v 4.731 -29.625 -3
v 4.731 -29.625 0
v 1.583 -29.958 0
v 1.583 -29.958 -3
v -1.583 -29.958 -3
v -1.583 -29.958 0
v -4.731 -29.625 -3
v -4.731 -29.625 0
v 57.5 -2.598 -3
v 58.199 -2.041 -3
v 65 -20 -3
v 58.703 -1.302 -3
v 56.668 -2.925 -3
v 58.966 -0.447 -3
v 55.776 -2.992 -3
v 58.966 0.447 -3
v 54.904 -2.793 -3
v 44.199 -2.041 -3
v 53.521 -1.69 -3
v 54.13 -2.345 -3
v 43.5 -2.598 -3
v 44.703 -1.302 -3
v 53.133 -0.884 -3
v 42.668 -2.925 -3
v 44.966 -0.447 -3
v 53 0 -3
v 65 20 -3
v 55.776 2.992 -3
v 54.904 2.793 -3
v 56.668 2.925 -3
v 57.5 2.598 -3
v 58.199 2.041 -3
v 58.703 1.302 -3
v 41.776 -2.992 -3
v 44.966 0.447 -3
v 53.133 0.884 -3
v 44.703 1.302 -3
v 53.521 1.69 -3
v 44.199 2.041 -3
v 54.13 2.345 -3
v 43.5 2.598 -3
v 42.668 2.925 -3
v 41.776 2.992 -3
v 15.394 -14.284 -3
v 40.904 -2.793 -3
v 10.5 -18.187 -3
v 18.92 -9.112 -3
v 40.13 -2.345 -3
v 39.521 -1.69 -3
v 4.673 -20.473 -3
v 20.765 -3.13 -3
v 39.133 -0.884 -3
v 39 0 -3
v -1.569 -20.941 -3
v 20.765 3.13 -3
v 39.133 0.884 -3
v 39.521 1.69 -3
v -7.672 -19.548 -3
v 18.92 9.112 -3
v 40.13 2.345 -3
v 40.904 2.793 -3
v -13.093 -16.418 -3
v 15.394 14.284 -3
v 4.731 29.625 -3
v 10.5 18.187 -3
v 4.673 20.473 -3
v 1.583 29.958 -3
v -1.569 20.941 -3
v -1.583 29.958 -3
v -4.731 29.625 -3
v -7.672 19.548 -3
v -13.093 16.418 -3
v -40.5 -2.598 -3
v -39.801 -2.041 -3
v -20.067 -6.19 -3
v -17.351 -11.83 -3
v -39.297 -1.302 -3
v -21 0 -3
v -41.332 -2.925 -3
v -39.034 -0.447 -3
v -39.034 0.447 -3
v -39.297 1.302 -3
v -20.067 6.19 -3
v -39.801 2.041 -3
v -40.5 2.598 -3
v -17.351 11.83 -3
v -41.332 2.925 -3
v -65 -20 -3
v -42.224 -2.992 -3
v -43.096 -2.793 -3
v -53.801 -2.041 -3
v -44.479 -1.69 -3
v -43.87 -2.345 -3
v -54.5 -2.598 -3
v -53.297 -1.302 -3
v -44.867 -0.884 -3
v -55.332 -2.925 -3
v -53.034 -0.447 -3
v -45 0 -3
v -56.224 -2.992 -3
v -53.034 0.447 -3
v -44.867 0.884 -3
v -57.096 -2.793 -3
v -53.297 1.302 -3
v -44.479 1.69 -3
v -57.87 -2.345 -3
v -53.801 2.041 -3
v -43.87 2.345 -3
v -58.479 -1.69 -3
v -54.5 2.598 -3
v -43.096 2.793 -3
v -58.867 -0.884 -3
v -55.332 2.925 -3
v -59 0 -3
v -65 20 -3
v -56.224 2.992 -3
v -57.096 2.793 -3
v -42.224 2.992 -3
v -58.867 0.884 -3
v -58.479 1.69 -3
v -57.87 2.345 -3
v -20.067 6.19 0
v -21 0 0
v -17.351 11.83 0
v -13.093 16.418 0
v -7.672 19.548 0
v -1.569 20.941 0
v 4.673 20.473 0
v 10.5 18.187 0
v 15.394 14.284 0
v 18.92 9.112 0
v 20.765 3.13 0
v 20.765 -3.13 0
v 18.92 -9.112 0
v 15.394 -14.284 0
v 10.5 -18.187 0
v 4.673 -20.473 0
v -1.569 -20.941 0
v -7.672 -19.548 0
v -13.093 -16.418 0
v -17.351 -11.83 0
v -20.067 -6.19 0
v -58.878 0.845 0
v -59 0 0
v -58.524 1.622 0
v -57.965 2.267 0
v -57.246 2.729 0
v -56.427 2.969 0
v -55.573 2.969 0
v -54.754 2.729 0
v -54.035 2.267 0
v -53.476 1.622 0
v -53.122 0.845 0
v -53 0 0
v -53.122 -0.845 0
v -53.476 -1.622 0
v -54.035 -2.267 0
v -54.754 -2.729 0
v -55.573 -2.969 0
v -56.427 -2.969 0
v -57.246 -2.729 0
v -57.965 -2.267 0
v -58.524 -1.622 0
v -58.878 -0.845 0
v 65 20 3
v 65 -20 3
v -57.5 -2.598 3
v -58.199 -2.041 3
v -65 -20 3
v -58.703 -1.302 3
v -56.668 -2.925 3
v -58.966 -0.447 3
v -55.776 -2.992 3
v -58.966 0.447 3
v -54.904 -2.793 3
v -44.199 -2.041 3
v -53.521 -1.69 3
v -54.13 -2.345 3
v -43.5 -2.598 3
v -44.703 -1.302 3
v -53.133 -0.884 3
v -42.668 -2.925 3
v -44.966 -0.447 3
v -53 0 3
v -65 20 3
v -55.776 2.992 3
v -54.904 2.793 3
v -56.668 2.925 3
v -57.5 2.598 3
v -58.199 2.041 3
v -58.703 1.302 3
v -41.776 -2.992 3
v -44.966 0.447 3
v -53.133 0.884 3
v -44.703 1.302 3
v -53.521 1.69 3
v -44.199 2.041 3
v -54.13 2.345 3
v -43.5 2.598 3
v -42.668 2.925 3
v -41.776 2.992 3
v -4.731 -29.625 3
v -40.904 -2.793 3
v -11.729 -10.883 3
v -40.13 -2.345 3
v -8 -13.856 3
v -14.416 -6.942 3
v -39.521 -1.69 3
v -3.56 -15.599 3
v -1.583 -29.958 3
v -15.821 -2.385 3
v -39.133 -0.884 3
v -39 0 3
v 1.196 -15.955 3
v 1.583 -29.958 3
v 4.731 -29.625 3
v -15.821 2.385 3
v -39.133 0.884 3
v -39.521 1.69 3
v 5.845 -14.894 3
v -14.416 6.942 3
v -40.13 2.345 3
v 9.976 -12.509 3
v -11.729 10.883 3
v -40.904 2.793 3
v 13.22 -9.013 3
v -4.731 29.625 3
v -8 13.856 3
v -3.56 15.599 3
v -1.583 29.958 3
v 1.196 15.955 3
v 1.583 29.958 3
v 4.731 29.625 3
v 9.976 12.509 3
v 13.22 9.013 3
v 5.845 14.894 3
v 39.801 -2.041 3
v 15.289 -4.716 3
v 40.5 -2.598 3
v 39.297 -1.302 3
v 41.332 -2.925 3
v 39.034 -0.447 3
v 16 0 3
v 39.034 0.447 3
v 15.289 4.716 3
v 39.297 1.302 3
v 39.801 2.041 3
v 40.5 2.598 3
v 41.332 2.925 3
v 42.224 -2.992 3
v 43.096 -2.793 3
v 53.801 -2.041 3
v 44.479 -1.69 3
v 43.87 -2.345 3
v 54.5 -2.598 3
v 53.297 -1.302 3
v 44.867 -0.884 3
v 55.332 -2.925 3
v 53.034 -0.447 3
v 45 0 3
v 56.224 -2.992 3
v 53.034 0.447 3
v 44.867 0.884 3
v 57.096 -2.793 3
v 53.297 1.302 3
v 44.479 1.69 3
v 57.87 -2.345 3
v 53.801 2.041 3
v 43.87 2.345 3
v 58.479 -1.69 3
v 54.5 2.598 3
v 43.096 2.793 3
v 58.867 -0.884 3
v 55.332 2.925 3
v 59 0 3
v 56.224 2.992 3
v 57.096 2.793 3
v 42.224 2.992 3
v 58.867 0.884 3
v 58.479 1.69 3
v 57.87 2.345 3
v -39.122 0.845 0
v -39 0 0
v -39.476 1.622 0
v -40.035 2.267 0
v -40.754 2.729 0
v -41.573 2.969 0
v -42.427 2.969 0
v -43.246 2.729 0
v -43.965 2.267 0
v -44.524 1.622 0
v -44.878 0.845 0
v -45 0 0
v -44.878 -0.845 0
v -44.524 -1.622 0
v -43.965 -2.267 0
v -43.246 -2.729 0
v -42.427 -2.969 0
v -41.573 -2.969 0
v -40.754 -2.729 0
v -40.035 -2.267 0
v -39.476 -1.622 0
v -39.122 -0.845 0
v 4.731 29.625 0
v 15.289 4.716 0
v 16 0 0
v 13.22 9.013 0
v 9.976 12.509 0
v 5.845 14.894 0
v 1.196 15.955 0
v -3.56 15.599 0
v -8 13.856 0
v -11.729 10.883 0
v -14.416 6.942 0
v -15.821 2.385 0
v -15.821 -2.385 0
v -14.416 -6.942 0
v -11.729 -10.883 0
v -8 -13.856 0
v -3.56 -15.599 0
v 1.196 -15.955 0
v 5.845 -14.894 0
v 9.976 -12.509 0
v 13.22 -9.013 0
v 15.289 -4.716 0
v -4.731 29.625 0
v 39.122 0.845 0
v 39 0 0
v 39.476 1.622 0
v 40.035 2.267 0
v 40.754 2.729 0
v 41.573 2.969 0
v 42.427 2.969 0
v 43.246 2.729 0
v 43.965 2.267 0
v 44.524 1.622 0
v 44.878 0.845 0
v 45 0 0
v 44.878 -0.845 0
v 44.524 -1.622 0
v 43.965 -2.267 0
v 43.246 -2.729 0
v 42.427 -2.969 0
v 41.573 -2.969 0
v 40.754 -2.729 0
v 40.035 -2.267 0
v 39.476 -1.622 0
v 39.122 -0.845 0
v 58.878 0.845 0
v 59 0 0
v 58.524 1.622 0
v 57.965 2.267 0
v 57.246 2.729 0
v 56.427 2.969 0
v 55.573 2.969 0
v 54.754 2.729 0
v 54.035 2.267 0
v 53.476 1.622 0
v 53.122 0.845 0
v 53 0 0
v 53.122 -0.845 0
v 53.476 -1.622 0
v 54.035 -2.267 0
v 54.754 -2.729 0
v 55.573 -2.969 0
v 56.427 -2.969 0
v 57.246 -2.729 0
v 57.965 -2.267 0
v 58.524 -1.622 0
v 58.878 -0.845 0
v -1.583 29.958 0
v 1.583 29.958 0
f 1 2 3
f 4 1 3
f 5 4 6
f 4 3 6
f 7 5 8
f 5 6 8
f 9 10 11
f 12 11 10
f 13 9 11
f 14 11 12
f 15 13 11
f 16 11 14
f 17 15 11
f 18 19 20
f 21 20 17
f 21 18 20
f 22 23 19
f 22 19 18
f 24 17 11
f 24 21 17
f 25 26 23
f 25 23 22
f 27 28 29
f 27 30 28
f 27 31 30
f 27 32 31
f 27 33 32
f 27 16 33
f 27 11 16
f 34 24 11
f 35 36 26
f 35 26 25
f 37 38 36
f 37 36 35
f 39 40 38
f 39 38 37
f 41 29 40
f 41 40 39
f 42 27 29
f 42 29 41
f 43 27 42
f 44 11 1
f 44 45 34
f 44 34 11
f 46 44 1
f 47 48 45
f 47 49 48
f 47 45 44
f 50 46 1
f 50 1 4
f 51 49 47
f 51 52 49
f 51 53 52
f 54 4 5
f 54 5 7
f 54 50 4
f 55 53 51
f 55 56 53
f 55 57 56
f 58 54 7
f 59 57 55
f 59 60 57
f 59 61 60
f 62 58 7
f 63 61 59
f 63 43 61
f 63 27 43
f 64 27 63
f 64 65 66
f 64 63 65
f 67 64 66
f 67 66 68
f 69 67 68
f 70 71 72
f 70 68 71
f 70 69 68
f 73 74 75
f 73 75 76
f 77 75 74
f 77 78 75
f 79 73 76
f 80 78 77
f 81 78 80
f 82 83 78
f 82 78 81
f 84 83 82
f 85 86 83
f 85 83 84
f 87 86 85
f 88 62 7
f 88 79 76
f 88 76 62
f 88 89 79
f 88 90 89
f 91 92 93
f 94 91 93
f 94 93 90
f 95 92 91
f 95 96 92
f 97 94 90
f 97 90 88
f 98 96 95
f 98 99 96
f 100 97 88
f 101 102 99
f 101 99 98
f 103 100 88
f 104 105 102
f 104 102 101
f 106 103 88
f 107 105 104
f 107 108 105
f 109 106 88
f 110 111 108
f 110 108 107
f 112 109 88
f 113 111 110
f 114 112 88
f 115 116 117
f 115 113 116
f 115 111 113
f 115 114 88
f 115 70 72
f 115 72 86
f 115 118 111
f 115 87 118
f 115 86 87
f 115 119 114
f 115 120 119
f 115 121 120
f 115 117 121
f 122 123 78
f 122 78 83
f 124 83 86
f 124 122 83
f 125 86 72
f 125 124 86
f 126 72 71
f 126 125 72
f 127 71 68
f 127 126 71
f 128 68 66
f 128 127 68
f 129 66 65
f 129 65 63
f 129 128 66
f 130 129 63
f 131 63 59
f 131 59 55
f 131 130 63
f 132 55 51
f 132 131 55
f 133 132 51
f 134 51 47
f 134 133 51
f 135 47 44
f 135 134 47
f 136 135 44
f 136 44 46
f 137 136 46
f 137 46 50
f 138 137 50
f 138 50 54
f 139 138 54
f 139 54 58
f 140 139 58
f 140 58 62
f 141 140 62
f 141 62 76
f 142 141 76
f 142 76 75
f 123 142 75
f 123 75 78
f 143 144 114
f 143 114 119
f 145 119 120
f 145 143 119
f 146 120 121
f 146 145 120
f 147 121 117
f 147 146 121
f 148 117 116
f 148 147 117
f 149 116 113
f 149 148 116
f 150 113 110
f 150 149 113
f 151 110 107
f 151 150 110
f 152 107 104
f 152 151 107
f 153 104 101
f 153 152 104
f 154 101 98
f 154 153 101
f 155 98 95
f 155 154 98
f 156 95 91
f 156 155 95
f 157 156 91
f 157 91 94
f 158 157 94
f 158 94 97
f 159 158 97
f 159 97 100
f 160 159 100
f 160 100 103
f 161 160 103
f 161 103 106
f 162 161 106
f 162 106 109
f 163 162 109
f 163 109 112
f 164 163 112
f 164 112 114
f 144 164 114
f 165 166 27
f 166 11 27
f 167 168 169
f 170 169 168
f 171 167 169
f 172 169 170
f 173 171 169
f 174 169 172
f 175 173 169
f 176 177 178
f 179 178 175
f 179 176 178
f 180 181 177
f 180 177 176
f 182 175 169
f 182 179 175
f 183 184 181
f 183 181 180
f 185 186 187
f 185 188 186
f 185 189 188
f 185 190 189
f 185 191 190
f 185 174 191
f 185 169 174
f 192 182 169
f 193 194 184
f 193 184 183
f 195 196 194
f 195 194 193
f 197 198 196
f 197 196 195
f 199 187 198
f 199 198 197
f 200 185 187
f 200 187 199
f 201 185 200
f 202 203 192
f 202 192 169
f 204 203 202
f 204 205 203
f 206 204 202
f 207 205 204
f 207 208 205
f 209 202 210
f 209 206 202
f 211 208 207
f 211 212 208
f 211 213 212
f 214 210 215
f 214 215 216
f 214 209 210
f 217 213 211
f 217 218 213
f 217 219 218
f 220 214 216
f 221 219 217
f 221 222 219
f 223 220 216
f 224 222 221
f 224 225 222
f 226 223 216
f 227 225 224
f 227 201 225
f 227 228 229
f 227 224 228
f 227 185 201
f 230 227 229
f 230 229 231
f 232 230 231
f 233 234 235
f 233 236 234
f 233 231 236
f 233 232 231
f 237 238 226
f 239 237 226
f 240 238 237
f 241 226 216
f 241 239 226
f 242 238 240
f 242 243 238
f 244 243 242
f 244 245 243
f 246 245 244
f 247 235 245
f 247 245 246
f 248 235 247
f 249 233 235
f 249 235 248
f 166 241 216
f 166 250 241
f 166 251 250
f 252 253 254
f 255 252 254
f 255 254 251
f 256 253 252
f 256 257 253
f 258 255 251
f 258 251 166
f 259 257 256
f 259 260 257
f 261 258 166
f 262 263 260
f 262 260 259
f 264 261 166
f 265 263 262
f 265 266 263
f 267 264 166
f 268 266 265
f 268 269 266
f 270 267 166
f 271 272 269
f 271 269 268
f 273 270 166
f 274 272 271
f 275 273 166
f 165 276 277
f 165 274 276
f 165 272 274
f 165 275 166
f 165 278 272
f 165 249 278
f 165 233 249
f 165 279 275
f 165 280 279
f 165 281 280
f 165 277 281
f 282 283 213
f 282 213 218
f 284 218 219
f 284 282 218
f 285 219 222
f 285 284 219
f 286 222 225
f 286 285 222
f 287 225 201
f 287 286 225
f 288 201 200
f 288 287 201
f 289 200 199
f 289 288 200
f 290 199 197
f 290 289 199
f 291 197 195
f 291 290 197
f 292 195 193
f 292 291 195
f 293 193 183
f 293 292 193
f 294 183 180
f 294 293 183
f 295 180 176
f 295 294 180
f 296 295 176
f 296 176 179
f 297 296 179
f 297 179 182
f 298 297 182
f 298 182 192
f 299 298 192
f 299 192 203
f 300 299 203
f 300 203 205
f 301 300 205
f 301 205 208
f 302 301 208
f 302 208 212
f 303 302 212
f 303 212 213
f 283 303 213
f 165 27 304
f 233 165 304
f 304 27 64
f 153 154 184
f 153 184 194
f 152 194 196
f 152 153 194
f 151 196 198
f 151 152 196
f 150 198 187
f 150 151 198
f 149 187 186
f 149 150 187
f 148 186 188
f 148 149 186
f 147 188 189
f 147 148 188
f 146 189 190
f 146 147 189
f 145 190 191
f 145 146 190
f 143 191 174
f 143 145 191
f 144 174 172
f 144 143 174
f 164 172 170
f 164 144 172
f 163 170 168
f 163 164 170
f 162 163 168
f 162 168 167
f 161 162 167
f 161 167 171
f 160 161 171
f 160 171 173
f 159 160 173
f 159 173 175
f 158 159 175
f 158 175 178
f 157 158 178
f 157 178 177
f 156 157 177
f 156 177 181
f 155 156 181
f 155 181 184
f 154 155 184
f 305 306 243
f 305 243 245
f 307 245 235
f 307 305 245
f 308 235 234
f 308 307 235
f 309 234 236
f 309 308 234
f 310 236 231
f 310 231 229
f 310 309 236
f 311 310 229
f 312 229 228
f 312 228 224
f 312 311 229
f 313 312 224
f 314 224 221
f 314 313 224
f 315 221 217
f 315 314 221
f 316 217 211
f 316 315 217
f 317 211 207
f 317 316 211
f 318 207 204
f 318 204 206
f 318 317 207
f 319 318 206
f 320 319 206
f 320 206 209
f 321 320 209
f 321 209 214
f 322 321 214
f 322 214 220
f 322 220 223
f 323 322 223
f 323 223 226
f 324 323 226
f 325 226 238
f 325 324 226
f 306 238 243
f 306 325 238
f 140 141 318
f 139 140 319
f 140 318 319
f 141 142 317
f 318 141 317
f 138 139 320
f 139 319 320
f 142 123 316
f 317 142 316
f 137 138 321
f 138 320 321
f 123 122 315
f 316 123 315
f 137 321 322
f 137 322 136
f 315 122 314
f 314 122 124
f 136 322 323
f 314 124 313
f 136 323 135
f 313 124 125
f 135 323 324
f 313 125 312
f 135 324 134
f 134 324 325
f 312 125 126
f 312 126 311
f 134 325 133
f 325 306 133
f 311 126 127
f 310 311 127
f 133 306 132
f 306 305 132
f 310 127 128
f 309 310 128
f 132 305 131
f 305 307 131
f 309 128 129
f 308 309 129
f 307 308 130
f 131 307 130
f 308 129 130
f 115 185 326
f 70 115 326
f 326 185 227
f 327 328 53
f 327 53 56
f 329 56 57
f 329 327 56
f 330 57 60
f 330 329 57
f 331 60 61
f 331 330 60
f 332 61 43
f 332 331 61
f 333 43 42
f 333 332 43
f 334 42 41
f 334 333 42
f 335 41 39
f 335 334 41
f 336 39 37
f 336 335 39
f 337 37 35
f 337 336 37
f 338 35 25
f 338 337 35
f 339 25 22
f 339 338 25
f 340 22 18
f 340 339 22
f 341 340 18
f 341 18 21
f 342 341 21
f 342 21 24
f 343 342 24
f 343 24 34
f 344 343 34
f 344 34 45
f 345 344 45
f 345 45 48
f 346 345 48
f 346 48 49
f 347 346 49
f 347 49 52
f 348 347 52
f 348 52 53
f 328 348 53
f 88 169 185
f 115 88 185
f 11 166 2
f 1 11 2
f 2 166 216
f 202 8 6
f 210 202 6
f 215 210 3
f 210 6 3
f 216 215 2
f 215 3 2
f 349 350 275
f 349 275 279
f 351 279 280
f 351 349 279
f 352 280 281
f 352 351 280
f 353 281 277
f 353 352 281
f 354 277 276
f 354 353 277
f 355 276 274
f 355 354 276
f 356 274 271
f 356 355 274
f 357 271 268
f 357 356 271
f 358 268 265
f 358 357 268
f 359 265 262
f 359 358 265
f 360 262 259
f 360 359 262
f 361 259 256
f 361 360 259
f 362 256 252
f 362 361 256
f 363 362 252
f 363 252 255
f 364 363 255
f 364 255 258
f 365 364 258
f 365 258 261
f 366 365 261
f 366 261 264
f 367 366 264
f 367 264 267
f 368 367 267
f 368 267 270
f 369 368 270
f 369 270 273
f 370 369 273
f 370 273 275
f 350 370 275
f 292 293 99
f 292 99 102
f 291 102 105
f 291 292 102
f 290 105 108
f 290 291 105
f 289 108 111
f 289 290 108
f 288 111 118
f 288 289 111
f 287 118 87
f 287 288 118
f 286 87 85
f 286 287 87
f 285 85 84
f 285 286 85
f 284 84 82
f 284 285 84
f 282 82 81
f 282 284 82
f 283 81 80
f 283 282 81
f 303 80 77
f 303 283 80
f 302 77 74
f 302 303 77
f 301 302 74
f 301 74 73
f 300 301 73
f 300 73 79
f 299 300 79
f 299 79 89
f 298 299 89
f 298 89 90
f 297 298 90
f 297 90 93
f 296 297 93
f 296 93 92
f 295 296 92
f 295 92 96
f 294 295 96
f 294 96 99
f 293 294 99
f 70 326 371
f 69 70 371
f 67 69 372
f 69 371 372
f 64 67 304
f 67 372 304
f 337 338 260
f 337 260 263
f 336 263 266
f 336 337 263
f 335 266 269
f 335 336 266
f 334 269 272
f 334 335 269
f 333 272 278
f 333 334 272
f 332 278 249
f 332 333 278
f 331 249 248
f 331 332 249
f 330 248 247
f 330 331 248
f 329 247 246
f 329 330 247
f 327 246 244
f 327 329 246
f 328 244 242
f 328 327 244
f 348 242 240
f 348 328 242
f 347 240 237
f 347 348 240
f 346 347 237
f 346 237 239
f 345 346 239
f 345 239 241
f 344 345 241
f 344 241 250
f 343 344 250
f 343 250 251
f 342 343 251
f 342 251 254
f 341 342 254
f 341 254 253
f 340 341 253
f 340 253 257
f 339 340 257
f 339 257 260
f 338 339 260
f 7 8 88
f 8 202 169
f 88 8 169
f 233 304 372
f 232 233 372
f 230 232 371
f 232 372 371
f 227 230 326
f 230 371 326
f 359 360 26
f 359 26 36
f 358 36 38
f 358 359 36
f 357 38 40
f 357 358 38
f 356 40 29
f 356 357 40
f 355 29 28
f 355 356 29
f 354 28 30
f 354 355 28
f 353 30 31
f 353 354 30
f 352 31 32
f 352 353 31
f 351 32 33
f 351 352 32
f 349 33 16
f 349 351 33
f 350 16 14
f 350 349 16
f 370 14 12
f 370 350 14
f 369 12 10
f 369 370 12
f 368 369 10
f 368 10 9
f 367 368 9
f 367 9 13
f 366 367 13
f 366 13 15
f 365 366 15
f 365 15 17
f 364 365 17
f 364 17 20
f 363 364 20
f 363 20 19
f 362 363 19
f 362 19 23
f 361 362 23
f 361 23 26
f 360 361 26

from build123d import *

# Parameters (mm, degrees)
SKETCH1_R           = 3
SKETCH1_R_2         = 16
BOSS_EXTRUDE1_DEPTH = 3
SKETCH3_R           = 30
SKETCH3_R_2         = 21
BOSS_EXTRUDE3_DEPTH = 3.5
SKETCH4_R           = 3
BOSS_EXTRUDE4_DEPTH = 3.5
SKETCH5_R           = 3
SKETCH5_R_2         = 21
CUT_EXTRUDE1_DEPTH  = 0.5


with BuildPart() as part:
    # Sketch1 → Boss-Extrude1 (new body)
    with BuildSketch(Plane.XY):
        with BuildLine():
            Line((-65, 20), (-65, -20))
            Line((-65, -20), (-4.730882844, -29.624630757))
            ThreePointArc((-4.730882844, -29.624630757), (0, -30), (4.730882844, -29.624630757))
            Line((4.730882844, -29.624630757), (65, -20))
            Line((65, -20), (65, 20))
            Line((65, 20), (4.730882844, 29.624630757))
            ThreePointArc((4.730882844, 29.624630757), (0, 30), (-4.730882844, 29.624630757))
            Line((-4.730882844, 29.624630757), (-65, 20))
        make_face()
        with Locations((56, 0)):
            Circle(SKETCH1_R, mode=Mode.SUBTRACT)
        with Locations((42, 0)):
            Circle(SKETCH1_R, mode=Mode.SUBTRACT)
        with Locations((-56, 0)):
            Circle(SKETCH1_R, mode=Mode.SUBTRACT)
        with Locations((-42, 0)):
            Circle(SKETCH1_R, mode=Mode.SUBTRACT)
        Circle(SKETCH1_R_2, mode=Mode.SUBTRACT)
    extrude(amount=BOSS_EXTRUDE1_DEPTH)

    # Sketch3 → Boss-Extrude3 (add)
    with BuildSketch(Plane(origin=(0, 0, 0), x_dir=(-1, 0, 0), z_dir=(0, 0, -1))):
        Circle(SKETCH3_R)
        Circle(SKETCH3_R_2, mode=Mode.SUBTRACT)
    extrude(amount=BOSS_EXTRUDE3_DEPTH)

    # Sketch4 → Boss-Extrude4 (add)
    with BuildSketch(Plane(origin=(0, 0, 0), x_dir=(-1, 0, 0), z_dir=(0, 0, -1))):
        with BuildLine():
            Line((4.730882844, -29.624630757), (65, -20))
            Line((65, -20), (65, 20))
            Line((65, 20), (4.730882844, 29.624630757))
            ThreePointArc((4.730882844, 29.624630757), (30, 0), (4.730882844, -29.624630757))
        make_face()
        with Locations((56, 0)):
            Circle(SKETCH4_R, mode=Mode.SUBTRACT)
        with Locations((42, 0)):
            Circle(SKETCH4_R, mode=Mode.SUBTRACT)
        with BuildLine():
            Line((-4.730882844, 29.624630757), (-65, 20))
            Line((-65, 20), (-65, -20))
            Line((-65, -20), (-4.730882844, -29.624630757))
            ThreePointArc((-4.730882844, -29.624630757), (-30, 0), (-4.730882844, 29.624630757))
        make_face()
        with Locations((-42, 0)):
            Circle(SKETCH4_R, mode=Mode.SUBTRACT)
        with Locations((-56, 0)):
            Circle(SKETCH4_R, mode=Mode.SUBTRACT)
    extrude(amount=BOSS_EXTRUDE4_DEPTH)

    # Sketch5 → Cut-Extrude1 (cut)
    with BuildSketch(Plane(origin=(0, 0, -3.5), x_dir=(-1, 0, 0), z_dir=(0, 0, -1))):
        with BuildLine():
            Line((-4.730882844, 29.624630757), (-65, 20))
            Line((-65, 20), (-65, -20))
            Line((-65, -20), (-4.730882844, -29.624630757))
            ThreePointArc((-4.730882844, -29.624630757), (0, -30), (4.730882844, -29.624630757))
            Line((4.730882844, -29.624630757), (65, -20))
            Line((65, -20), (65, 20))
            Line((65, 20), (4.730882844, 29.624630757))
            ThreePointArc((4.730882844, 29.624630757), (0, 30), (-4.730882844, 29.624630757))
        make_face()
        with Locations((56, 0)):
            Circle(SKETCH5_R, mode=Mode.SUBTRACT)
        with Locations((42, 0)):
            Circle(SKETCH5_R, mode=Mode.SUBTRACT)
        Circle(SKETCH5_R_2, mode=Mode.SUBTRACT)
        with Locations((-42, 0)):
            Circle(SKETCH5_R, mode=Mode.SUBTRACT)
        with Locations((-56, 0)):
            Circle(SKETCH5_R, mode=Mode.SUBTRACT)
    extrude(amount=-CUT_EXTRUDE1_DEPTH, mode=Mode.SUBTRACT)


solid = part.part
